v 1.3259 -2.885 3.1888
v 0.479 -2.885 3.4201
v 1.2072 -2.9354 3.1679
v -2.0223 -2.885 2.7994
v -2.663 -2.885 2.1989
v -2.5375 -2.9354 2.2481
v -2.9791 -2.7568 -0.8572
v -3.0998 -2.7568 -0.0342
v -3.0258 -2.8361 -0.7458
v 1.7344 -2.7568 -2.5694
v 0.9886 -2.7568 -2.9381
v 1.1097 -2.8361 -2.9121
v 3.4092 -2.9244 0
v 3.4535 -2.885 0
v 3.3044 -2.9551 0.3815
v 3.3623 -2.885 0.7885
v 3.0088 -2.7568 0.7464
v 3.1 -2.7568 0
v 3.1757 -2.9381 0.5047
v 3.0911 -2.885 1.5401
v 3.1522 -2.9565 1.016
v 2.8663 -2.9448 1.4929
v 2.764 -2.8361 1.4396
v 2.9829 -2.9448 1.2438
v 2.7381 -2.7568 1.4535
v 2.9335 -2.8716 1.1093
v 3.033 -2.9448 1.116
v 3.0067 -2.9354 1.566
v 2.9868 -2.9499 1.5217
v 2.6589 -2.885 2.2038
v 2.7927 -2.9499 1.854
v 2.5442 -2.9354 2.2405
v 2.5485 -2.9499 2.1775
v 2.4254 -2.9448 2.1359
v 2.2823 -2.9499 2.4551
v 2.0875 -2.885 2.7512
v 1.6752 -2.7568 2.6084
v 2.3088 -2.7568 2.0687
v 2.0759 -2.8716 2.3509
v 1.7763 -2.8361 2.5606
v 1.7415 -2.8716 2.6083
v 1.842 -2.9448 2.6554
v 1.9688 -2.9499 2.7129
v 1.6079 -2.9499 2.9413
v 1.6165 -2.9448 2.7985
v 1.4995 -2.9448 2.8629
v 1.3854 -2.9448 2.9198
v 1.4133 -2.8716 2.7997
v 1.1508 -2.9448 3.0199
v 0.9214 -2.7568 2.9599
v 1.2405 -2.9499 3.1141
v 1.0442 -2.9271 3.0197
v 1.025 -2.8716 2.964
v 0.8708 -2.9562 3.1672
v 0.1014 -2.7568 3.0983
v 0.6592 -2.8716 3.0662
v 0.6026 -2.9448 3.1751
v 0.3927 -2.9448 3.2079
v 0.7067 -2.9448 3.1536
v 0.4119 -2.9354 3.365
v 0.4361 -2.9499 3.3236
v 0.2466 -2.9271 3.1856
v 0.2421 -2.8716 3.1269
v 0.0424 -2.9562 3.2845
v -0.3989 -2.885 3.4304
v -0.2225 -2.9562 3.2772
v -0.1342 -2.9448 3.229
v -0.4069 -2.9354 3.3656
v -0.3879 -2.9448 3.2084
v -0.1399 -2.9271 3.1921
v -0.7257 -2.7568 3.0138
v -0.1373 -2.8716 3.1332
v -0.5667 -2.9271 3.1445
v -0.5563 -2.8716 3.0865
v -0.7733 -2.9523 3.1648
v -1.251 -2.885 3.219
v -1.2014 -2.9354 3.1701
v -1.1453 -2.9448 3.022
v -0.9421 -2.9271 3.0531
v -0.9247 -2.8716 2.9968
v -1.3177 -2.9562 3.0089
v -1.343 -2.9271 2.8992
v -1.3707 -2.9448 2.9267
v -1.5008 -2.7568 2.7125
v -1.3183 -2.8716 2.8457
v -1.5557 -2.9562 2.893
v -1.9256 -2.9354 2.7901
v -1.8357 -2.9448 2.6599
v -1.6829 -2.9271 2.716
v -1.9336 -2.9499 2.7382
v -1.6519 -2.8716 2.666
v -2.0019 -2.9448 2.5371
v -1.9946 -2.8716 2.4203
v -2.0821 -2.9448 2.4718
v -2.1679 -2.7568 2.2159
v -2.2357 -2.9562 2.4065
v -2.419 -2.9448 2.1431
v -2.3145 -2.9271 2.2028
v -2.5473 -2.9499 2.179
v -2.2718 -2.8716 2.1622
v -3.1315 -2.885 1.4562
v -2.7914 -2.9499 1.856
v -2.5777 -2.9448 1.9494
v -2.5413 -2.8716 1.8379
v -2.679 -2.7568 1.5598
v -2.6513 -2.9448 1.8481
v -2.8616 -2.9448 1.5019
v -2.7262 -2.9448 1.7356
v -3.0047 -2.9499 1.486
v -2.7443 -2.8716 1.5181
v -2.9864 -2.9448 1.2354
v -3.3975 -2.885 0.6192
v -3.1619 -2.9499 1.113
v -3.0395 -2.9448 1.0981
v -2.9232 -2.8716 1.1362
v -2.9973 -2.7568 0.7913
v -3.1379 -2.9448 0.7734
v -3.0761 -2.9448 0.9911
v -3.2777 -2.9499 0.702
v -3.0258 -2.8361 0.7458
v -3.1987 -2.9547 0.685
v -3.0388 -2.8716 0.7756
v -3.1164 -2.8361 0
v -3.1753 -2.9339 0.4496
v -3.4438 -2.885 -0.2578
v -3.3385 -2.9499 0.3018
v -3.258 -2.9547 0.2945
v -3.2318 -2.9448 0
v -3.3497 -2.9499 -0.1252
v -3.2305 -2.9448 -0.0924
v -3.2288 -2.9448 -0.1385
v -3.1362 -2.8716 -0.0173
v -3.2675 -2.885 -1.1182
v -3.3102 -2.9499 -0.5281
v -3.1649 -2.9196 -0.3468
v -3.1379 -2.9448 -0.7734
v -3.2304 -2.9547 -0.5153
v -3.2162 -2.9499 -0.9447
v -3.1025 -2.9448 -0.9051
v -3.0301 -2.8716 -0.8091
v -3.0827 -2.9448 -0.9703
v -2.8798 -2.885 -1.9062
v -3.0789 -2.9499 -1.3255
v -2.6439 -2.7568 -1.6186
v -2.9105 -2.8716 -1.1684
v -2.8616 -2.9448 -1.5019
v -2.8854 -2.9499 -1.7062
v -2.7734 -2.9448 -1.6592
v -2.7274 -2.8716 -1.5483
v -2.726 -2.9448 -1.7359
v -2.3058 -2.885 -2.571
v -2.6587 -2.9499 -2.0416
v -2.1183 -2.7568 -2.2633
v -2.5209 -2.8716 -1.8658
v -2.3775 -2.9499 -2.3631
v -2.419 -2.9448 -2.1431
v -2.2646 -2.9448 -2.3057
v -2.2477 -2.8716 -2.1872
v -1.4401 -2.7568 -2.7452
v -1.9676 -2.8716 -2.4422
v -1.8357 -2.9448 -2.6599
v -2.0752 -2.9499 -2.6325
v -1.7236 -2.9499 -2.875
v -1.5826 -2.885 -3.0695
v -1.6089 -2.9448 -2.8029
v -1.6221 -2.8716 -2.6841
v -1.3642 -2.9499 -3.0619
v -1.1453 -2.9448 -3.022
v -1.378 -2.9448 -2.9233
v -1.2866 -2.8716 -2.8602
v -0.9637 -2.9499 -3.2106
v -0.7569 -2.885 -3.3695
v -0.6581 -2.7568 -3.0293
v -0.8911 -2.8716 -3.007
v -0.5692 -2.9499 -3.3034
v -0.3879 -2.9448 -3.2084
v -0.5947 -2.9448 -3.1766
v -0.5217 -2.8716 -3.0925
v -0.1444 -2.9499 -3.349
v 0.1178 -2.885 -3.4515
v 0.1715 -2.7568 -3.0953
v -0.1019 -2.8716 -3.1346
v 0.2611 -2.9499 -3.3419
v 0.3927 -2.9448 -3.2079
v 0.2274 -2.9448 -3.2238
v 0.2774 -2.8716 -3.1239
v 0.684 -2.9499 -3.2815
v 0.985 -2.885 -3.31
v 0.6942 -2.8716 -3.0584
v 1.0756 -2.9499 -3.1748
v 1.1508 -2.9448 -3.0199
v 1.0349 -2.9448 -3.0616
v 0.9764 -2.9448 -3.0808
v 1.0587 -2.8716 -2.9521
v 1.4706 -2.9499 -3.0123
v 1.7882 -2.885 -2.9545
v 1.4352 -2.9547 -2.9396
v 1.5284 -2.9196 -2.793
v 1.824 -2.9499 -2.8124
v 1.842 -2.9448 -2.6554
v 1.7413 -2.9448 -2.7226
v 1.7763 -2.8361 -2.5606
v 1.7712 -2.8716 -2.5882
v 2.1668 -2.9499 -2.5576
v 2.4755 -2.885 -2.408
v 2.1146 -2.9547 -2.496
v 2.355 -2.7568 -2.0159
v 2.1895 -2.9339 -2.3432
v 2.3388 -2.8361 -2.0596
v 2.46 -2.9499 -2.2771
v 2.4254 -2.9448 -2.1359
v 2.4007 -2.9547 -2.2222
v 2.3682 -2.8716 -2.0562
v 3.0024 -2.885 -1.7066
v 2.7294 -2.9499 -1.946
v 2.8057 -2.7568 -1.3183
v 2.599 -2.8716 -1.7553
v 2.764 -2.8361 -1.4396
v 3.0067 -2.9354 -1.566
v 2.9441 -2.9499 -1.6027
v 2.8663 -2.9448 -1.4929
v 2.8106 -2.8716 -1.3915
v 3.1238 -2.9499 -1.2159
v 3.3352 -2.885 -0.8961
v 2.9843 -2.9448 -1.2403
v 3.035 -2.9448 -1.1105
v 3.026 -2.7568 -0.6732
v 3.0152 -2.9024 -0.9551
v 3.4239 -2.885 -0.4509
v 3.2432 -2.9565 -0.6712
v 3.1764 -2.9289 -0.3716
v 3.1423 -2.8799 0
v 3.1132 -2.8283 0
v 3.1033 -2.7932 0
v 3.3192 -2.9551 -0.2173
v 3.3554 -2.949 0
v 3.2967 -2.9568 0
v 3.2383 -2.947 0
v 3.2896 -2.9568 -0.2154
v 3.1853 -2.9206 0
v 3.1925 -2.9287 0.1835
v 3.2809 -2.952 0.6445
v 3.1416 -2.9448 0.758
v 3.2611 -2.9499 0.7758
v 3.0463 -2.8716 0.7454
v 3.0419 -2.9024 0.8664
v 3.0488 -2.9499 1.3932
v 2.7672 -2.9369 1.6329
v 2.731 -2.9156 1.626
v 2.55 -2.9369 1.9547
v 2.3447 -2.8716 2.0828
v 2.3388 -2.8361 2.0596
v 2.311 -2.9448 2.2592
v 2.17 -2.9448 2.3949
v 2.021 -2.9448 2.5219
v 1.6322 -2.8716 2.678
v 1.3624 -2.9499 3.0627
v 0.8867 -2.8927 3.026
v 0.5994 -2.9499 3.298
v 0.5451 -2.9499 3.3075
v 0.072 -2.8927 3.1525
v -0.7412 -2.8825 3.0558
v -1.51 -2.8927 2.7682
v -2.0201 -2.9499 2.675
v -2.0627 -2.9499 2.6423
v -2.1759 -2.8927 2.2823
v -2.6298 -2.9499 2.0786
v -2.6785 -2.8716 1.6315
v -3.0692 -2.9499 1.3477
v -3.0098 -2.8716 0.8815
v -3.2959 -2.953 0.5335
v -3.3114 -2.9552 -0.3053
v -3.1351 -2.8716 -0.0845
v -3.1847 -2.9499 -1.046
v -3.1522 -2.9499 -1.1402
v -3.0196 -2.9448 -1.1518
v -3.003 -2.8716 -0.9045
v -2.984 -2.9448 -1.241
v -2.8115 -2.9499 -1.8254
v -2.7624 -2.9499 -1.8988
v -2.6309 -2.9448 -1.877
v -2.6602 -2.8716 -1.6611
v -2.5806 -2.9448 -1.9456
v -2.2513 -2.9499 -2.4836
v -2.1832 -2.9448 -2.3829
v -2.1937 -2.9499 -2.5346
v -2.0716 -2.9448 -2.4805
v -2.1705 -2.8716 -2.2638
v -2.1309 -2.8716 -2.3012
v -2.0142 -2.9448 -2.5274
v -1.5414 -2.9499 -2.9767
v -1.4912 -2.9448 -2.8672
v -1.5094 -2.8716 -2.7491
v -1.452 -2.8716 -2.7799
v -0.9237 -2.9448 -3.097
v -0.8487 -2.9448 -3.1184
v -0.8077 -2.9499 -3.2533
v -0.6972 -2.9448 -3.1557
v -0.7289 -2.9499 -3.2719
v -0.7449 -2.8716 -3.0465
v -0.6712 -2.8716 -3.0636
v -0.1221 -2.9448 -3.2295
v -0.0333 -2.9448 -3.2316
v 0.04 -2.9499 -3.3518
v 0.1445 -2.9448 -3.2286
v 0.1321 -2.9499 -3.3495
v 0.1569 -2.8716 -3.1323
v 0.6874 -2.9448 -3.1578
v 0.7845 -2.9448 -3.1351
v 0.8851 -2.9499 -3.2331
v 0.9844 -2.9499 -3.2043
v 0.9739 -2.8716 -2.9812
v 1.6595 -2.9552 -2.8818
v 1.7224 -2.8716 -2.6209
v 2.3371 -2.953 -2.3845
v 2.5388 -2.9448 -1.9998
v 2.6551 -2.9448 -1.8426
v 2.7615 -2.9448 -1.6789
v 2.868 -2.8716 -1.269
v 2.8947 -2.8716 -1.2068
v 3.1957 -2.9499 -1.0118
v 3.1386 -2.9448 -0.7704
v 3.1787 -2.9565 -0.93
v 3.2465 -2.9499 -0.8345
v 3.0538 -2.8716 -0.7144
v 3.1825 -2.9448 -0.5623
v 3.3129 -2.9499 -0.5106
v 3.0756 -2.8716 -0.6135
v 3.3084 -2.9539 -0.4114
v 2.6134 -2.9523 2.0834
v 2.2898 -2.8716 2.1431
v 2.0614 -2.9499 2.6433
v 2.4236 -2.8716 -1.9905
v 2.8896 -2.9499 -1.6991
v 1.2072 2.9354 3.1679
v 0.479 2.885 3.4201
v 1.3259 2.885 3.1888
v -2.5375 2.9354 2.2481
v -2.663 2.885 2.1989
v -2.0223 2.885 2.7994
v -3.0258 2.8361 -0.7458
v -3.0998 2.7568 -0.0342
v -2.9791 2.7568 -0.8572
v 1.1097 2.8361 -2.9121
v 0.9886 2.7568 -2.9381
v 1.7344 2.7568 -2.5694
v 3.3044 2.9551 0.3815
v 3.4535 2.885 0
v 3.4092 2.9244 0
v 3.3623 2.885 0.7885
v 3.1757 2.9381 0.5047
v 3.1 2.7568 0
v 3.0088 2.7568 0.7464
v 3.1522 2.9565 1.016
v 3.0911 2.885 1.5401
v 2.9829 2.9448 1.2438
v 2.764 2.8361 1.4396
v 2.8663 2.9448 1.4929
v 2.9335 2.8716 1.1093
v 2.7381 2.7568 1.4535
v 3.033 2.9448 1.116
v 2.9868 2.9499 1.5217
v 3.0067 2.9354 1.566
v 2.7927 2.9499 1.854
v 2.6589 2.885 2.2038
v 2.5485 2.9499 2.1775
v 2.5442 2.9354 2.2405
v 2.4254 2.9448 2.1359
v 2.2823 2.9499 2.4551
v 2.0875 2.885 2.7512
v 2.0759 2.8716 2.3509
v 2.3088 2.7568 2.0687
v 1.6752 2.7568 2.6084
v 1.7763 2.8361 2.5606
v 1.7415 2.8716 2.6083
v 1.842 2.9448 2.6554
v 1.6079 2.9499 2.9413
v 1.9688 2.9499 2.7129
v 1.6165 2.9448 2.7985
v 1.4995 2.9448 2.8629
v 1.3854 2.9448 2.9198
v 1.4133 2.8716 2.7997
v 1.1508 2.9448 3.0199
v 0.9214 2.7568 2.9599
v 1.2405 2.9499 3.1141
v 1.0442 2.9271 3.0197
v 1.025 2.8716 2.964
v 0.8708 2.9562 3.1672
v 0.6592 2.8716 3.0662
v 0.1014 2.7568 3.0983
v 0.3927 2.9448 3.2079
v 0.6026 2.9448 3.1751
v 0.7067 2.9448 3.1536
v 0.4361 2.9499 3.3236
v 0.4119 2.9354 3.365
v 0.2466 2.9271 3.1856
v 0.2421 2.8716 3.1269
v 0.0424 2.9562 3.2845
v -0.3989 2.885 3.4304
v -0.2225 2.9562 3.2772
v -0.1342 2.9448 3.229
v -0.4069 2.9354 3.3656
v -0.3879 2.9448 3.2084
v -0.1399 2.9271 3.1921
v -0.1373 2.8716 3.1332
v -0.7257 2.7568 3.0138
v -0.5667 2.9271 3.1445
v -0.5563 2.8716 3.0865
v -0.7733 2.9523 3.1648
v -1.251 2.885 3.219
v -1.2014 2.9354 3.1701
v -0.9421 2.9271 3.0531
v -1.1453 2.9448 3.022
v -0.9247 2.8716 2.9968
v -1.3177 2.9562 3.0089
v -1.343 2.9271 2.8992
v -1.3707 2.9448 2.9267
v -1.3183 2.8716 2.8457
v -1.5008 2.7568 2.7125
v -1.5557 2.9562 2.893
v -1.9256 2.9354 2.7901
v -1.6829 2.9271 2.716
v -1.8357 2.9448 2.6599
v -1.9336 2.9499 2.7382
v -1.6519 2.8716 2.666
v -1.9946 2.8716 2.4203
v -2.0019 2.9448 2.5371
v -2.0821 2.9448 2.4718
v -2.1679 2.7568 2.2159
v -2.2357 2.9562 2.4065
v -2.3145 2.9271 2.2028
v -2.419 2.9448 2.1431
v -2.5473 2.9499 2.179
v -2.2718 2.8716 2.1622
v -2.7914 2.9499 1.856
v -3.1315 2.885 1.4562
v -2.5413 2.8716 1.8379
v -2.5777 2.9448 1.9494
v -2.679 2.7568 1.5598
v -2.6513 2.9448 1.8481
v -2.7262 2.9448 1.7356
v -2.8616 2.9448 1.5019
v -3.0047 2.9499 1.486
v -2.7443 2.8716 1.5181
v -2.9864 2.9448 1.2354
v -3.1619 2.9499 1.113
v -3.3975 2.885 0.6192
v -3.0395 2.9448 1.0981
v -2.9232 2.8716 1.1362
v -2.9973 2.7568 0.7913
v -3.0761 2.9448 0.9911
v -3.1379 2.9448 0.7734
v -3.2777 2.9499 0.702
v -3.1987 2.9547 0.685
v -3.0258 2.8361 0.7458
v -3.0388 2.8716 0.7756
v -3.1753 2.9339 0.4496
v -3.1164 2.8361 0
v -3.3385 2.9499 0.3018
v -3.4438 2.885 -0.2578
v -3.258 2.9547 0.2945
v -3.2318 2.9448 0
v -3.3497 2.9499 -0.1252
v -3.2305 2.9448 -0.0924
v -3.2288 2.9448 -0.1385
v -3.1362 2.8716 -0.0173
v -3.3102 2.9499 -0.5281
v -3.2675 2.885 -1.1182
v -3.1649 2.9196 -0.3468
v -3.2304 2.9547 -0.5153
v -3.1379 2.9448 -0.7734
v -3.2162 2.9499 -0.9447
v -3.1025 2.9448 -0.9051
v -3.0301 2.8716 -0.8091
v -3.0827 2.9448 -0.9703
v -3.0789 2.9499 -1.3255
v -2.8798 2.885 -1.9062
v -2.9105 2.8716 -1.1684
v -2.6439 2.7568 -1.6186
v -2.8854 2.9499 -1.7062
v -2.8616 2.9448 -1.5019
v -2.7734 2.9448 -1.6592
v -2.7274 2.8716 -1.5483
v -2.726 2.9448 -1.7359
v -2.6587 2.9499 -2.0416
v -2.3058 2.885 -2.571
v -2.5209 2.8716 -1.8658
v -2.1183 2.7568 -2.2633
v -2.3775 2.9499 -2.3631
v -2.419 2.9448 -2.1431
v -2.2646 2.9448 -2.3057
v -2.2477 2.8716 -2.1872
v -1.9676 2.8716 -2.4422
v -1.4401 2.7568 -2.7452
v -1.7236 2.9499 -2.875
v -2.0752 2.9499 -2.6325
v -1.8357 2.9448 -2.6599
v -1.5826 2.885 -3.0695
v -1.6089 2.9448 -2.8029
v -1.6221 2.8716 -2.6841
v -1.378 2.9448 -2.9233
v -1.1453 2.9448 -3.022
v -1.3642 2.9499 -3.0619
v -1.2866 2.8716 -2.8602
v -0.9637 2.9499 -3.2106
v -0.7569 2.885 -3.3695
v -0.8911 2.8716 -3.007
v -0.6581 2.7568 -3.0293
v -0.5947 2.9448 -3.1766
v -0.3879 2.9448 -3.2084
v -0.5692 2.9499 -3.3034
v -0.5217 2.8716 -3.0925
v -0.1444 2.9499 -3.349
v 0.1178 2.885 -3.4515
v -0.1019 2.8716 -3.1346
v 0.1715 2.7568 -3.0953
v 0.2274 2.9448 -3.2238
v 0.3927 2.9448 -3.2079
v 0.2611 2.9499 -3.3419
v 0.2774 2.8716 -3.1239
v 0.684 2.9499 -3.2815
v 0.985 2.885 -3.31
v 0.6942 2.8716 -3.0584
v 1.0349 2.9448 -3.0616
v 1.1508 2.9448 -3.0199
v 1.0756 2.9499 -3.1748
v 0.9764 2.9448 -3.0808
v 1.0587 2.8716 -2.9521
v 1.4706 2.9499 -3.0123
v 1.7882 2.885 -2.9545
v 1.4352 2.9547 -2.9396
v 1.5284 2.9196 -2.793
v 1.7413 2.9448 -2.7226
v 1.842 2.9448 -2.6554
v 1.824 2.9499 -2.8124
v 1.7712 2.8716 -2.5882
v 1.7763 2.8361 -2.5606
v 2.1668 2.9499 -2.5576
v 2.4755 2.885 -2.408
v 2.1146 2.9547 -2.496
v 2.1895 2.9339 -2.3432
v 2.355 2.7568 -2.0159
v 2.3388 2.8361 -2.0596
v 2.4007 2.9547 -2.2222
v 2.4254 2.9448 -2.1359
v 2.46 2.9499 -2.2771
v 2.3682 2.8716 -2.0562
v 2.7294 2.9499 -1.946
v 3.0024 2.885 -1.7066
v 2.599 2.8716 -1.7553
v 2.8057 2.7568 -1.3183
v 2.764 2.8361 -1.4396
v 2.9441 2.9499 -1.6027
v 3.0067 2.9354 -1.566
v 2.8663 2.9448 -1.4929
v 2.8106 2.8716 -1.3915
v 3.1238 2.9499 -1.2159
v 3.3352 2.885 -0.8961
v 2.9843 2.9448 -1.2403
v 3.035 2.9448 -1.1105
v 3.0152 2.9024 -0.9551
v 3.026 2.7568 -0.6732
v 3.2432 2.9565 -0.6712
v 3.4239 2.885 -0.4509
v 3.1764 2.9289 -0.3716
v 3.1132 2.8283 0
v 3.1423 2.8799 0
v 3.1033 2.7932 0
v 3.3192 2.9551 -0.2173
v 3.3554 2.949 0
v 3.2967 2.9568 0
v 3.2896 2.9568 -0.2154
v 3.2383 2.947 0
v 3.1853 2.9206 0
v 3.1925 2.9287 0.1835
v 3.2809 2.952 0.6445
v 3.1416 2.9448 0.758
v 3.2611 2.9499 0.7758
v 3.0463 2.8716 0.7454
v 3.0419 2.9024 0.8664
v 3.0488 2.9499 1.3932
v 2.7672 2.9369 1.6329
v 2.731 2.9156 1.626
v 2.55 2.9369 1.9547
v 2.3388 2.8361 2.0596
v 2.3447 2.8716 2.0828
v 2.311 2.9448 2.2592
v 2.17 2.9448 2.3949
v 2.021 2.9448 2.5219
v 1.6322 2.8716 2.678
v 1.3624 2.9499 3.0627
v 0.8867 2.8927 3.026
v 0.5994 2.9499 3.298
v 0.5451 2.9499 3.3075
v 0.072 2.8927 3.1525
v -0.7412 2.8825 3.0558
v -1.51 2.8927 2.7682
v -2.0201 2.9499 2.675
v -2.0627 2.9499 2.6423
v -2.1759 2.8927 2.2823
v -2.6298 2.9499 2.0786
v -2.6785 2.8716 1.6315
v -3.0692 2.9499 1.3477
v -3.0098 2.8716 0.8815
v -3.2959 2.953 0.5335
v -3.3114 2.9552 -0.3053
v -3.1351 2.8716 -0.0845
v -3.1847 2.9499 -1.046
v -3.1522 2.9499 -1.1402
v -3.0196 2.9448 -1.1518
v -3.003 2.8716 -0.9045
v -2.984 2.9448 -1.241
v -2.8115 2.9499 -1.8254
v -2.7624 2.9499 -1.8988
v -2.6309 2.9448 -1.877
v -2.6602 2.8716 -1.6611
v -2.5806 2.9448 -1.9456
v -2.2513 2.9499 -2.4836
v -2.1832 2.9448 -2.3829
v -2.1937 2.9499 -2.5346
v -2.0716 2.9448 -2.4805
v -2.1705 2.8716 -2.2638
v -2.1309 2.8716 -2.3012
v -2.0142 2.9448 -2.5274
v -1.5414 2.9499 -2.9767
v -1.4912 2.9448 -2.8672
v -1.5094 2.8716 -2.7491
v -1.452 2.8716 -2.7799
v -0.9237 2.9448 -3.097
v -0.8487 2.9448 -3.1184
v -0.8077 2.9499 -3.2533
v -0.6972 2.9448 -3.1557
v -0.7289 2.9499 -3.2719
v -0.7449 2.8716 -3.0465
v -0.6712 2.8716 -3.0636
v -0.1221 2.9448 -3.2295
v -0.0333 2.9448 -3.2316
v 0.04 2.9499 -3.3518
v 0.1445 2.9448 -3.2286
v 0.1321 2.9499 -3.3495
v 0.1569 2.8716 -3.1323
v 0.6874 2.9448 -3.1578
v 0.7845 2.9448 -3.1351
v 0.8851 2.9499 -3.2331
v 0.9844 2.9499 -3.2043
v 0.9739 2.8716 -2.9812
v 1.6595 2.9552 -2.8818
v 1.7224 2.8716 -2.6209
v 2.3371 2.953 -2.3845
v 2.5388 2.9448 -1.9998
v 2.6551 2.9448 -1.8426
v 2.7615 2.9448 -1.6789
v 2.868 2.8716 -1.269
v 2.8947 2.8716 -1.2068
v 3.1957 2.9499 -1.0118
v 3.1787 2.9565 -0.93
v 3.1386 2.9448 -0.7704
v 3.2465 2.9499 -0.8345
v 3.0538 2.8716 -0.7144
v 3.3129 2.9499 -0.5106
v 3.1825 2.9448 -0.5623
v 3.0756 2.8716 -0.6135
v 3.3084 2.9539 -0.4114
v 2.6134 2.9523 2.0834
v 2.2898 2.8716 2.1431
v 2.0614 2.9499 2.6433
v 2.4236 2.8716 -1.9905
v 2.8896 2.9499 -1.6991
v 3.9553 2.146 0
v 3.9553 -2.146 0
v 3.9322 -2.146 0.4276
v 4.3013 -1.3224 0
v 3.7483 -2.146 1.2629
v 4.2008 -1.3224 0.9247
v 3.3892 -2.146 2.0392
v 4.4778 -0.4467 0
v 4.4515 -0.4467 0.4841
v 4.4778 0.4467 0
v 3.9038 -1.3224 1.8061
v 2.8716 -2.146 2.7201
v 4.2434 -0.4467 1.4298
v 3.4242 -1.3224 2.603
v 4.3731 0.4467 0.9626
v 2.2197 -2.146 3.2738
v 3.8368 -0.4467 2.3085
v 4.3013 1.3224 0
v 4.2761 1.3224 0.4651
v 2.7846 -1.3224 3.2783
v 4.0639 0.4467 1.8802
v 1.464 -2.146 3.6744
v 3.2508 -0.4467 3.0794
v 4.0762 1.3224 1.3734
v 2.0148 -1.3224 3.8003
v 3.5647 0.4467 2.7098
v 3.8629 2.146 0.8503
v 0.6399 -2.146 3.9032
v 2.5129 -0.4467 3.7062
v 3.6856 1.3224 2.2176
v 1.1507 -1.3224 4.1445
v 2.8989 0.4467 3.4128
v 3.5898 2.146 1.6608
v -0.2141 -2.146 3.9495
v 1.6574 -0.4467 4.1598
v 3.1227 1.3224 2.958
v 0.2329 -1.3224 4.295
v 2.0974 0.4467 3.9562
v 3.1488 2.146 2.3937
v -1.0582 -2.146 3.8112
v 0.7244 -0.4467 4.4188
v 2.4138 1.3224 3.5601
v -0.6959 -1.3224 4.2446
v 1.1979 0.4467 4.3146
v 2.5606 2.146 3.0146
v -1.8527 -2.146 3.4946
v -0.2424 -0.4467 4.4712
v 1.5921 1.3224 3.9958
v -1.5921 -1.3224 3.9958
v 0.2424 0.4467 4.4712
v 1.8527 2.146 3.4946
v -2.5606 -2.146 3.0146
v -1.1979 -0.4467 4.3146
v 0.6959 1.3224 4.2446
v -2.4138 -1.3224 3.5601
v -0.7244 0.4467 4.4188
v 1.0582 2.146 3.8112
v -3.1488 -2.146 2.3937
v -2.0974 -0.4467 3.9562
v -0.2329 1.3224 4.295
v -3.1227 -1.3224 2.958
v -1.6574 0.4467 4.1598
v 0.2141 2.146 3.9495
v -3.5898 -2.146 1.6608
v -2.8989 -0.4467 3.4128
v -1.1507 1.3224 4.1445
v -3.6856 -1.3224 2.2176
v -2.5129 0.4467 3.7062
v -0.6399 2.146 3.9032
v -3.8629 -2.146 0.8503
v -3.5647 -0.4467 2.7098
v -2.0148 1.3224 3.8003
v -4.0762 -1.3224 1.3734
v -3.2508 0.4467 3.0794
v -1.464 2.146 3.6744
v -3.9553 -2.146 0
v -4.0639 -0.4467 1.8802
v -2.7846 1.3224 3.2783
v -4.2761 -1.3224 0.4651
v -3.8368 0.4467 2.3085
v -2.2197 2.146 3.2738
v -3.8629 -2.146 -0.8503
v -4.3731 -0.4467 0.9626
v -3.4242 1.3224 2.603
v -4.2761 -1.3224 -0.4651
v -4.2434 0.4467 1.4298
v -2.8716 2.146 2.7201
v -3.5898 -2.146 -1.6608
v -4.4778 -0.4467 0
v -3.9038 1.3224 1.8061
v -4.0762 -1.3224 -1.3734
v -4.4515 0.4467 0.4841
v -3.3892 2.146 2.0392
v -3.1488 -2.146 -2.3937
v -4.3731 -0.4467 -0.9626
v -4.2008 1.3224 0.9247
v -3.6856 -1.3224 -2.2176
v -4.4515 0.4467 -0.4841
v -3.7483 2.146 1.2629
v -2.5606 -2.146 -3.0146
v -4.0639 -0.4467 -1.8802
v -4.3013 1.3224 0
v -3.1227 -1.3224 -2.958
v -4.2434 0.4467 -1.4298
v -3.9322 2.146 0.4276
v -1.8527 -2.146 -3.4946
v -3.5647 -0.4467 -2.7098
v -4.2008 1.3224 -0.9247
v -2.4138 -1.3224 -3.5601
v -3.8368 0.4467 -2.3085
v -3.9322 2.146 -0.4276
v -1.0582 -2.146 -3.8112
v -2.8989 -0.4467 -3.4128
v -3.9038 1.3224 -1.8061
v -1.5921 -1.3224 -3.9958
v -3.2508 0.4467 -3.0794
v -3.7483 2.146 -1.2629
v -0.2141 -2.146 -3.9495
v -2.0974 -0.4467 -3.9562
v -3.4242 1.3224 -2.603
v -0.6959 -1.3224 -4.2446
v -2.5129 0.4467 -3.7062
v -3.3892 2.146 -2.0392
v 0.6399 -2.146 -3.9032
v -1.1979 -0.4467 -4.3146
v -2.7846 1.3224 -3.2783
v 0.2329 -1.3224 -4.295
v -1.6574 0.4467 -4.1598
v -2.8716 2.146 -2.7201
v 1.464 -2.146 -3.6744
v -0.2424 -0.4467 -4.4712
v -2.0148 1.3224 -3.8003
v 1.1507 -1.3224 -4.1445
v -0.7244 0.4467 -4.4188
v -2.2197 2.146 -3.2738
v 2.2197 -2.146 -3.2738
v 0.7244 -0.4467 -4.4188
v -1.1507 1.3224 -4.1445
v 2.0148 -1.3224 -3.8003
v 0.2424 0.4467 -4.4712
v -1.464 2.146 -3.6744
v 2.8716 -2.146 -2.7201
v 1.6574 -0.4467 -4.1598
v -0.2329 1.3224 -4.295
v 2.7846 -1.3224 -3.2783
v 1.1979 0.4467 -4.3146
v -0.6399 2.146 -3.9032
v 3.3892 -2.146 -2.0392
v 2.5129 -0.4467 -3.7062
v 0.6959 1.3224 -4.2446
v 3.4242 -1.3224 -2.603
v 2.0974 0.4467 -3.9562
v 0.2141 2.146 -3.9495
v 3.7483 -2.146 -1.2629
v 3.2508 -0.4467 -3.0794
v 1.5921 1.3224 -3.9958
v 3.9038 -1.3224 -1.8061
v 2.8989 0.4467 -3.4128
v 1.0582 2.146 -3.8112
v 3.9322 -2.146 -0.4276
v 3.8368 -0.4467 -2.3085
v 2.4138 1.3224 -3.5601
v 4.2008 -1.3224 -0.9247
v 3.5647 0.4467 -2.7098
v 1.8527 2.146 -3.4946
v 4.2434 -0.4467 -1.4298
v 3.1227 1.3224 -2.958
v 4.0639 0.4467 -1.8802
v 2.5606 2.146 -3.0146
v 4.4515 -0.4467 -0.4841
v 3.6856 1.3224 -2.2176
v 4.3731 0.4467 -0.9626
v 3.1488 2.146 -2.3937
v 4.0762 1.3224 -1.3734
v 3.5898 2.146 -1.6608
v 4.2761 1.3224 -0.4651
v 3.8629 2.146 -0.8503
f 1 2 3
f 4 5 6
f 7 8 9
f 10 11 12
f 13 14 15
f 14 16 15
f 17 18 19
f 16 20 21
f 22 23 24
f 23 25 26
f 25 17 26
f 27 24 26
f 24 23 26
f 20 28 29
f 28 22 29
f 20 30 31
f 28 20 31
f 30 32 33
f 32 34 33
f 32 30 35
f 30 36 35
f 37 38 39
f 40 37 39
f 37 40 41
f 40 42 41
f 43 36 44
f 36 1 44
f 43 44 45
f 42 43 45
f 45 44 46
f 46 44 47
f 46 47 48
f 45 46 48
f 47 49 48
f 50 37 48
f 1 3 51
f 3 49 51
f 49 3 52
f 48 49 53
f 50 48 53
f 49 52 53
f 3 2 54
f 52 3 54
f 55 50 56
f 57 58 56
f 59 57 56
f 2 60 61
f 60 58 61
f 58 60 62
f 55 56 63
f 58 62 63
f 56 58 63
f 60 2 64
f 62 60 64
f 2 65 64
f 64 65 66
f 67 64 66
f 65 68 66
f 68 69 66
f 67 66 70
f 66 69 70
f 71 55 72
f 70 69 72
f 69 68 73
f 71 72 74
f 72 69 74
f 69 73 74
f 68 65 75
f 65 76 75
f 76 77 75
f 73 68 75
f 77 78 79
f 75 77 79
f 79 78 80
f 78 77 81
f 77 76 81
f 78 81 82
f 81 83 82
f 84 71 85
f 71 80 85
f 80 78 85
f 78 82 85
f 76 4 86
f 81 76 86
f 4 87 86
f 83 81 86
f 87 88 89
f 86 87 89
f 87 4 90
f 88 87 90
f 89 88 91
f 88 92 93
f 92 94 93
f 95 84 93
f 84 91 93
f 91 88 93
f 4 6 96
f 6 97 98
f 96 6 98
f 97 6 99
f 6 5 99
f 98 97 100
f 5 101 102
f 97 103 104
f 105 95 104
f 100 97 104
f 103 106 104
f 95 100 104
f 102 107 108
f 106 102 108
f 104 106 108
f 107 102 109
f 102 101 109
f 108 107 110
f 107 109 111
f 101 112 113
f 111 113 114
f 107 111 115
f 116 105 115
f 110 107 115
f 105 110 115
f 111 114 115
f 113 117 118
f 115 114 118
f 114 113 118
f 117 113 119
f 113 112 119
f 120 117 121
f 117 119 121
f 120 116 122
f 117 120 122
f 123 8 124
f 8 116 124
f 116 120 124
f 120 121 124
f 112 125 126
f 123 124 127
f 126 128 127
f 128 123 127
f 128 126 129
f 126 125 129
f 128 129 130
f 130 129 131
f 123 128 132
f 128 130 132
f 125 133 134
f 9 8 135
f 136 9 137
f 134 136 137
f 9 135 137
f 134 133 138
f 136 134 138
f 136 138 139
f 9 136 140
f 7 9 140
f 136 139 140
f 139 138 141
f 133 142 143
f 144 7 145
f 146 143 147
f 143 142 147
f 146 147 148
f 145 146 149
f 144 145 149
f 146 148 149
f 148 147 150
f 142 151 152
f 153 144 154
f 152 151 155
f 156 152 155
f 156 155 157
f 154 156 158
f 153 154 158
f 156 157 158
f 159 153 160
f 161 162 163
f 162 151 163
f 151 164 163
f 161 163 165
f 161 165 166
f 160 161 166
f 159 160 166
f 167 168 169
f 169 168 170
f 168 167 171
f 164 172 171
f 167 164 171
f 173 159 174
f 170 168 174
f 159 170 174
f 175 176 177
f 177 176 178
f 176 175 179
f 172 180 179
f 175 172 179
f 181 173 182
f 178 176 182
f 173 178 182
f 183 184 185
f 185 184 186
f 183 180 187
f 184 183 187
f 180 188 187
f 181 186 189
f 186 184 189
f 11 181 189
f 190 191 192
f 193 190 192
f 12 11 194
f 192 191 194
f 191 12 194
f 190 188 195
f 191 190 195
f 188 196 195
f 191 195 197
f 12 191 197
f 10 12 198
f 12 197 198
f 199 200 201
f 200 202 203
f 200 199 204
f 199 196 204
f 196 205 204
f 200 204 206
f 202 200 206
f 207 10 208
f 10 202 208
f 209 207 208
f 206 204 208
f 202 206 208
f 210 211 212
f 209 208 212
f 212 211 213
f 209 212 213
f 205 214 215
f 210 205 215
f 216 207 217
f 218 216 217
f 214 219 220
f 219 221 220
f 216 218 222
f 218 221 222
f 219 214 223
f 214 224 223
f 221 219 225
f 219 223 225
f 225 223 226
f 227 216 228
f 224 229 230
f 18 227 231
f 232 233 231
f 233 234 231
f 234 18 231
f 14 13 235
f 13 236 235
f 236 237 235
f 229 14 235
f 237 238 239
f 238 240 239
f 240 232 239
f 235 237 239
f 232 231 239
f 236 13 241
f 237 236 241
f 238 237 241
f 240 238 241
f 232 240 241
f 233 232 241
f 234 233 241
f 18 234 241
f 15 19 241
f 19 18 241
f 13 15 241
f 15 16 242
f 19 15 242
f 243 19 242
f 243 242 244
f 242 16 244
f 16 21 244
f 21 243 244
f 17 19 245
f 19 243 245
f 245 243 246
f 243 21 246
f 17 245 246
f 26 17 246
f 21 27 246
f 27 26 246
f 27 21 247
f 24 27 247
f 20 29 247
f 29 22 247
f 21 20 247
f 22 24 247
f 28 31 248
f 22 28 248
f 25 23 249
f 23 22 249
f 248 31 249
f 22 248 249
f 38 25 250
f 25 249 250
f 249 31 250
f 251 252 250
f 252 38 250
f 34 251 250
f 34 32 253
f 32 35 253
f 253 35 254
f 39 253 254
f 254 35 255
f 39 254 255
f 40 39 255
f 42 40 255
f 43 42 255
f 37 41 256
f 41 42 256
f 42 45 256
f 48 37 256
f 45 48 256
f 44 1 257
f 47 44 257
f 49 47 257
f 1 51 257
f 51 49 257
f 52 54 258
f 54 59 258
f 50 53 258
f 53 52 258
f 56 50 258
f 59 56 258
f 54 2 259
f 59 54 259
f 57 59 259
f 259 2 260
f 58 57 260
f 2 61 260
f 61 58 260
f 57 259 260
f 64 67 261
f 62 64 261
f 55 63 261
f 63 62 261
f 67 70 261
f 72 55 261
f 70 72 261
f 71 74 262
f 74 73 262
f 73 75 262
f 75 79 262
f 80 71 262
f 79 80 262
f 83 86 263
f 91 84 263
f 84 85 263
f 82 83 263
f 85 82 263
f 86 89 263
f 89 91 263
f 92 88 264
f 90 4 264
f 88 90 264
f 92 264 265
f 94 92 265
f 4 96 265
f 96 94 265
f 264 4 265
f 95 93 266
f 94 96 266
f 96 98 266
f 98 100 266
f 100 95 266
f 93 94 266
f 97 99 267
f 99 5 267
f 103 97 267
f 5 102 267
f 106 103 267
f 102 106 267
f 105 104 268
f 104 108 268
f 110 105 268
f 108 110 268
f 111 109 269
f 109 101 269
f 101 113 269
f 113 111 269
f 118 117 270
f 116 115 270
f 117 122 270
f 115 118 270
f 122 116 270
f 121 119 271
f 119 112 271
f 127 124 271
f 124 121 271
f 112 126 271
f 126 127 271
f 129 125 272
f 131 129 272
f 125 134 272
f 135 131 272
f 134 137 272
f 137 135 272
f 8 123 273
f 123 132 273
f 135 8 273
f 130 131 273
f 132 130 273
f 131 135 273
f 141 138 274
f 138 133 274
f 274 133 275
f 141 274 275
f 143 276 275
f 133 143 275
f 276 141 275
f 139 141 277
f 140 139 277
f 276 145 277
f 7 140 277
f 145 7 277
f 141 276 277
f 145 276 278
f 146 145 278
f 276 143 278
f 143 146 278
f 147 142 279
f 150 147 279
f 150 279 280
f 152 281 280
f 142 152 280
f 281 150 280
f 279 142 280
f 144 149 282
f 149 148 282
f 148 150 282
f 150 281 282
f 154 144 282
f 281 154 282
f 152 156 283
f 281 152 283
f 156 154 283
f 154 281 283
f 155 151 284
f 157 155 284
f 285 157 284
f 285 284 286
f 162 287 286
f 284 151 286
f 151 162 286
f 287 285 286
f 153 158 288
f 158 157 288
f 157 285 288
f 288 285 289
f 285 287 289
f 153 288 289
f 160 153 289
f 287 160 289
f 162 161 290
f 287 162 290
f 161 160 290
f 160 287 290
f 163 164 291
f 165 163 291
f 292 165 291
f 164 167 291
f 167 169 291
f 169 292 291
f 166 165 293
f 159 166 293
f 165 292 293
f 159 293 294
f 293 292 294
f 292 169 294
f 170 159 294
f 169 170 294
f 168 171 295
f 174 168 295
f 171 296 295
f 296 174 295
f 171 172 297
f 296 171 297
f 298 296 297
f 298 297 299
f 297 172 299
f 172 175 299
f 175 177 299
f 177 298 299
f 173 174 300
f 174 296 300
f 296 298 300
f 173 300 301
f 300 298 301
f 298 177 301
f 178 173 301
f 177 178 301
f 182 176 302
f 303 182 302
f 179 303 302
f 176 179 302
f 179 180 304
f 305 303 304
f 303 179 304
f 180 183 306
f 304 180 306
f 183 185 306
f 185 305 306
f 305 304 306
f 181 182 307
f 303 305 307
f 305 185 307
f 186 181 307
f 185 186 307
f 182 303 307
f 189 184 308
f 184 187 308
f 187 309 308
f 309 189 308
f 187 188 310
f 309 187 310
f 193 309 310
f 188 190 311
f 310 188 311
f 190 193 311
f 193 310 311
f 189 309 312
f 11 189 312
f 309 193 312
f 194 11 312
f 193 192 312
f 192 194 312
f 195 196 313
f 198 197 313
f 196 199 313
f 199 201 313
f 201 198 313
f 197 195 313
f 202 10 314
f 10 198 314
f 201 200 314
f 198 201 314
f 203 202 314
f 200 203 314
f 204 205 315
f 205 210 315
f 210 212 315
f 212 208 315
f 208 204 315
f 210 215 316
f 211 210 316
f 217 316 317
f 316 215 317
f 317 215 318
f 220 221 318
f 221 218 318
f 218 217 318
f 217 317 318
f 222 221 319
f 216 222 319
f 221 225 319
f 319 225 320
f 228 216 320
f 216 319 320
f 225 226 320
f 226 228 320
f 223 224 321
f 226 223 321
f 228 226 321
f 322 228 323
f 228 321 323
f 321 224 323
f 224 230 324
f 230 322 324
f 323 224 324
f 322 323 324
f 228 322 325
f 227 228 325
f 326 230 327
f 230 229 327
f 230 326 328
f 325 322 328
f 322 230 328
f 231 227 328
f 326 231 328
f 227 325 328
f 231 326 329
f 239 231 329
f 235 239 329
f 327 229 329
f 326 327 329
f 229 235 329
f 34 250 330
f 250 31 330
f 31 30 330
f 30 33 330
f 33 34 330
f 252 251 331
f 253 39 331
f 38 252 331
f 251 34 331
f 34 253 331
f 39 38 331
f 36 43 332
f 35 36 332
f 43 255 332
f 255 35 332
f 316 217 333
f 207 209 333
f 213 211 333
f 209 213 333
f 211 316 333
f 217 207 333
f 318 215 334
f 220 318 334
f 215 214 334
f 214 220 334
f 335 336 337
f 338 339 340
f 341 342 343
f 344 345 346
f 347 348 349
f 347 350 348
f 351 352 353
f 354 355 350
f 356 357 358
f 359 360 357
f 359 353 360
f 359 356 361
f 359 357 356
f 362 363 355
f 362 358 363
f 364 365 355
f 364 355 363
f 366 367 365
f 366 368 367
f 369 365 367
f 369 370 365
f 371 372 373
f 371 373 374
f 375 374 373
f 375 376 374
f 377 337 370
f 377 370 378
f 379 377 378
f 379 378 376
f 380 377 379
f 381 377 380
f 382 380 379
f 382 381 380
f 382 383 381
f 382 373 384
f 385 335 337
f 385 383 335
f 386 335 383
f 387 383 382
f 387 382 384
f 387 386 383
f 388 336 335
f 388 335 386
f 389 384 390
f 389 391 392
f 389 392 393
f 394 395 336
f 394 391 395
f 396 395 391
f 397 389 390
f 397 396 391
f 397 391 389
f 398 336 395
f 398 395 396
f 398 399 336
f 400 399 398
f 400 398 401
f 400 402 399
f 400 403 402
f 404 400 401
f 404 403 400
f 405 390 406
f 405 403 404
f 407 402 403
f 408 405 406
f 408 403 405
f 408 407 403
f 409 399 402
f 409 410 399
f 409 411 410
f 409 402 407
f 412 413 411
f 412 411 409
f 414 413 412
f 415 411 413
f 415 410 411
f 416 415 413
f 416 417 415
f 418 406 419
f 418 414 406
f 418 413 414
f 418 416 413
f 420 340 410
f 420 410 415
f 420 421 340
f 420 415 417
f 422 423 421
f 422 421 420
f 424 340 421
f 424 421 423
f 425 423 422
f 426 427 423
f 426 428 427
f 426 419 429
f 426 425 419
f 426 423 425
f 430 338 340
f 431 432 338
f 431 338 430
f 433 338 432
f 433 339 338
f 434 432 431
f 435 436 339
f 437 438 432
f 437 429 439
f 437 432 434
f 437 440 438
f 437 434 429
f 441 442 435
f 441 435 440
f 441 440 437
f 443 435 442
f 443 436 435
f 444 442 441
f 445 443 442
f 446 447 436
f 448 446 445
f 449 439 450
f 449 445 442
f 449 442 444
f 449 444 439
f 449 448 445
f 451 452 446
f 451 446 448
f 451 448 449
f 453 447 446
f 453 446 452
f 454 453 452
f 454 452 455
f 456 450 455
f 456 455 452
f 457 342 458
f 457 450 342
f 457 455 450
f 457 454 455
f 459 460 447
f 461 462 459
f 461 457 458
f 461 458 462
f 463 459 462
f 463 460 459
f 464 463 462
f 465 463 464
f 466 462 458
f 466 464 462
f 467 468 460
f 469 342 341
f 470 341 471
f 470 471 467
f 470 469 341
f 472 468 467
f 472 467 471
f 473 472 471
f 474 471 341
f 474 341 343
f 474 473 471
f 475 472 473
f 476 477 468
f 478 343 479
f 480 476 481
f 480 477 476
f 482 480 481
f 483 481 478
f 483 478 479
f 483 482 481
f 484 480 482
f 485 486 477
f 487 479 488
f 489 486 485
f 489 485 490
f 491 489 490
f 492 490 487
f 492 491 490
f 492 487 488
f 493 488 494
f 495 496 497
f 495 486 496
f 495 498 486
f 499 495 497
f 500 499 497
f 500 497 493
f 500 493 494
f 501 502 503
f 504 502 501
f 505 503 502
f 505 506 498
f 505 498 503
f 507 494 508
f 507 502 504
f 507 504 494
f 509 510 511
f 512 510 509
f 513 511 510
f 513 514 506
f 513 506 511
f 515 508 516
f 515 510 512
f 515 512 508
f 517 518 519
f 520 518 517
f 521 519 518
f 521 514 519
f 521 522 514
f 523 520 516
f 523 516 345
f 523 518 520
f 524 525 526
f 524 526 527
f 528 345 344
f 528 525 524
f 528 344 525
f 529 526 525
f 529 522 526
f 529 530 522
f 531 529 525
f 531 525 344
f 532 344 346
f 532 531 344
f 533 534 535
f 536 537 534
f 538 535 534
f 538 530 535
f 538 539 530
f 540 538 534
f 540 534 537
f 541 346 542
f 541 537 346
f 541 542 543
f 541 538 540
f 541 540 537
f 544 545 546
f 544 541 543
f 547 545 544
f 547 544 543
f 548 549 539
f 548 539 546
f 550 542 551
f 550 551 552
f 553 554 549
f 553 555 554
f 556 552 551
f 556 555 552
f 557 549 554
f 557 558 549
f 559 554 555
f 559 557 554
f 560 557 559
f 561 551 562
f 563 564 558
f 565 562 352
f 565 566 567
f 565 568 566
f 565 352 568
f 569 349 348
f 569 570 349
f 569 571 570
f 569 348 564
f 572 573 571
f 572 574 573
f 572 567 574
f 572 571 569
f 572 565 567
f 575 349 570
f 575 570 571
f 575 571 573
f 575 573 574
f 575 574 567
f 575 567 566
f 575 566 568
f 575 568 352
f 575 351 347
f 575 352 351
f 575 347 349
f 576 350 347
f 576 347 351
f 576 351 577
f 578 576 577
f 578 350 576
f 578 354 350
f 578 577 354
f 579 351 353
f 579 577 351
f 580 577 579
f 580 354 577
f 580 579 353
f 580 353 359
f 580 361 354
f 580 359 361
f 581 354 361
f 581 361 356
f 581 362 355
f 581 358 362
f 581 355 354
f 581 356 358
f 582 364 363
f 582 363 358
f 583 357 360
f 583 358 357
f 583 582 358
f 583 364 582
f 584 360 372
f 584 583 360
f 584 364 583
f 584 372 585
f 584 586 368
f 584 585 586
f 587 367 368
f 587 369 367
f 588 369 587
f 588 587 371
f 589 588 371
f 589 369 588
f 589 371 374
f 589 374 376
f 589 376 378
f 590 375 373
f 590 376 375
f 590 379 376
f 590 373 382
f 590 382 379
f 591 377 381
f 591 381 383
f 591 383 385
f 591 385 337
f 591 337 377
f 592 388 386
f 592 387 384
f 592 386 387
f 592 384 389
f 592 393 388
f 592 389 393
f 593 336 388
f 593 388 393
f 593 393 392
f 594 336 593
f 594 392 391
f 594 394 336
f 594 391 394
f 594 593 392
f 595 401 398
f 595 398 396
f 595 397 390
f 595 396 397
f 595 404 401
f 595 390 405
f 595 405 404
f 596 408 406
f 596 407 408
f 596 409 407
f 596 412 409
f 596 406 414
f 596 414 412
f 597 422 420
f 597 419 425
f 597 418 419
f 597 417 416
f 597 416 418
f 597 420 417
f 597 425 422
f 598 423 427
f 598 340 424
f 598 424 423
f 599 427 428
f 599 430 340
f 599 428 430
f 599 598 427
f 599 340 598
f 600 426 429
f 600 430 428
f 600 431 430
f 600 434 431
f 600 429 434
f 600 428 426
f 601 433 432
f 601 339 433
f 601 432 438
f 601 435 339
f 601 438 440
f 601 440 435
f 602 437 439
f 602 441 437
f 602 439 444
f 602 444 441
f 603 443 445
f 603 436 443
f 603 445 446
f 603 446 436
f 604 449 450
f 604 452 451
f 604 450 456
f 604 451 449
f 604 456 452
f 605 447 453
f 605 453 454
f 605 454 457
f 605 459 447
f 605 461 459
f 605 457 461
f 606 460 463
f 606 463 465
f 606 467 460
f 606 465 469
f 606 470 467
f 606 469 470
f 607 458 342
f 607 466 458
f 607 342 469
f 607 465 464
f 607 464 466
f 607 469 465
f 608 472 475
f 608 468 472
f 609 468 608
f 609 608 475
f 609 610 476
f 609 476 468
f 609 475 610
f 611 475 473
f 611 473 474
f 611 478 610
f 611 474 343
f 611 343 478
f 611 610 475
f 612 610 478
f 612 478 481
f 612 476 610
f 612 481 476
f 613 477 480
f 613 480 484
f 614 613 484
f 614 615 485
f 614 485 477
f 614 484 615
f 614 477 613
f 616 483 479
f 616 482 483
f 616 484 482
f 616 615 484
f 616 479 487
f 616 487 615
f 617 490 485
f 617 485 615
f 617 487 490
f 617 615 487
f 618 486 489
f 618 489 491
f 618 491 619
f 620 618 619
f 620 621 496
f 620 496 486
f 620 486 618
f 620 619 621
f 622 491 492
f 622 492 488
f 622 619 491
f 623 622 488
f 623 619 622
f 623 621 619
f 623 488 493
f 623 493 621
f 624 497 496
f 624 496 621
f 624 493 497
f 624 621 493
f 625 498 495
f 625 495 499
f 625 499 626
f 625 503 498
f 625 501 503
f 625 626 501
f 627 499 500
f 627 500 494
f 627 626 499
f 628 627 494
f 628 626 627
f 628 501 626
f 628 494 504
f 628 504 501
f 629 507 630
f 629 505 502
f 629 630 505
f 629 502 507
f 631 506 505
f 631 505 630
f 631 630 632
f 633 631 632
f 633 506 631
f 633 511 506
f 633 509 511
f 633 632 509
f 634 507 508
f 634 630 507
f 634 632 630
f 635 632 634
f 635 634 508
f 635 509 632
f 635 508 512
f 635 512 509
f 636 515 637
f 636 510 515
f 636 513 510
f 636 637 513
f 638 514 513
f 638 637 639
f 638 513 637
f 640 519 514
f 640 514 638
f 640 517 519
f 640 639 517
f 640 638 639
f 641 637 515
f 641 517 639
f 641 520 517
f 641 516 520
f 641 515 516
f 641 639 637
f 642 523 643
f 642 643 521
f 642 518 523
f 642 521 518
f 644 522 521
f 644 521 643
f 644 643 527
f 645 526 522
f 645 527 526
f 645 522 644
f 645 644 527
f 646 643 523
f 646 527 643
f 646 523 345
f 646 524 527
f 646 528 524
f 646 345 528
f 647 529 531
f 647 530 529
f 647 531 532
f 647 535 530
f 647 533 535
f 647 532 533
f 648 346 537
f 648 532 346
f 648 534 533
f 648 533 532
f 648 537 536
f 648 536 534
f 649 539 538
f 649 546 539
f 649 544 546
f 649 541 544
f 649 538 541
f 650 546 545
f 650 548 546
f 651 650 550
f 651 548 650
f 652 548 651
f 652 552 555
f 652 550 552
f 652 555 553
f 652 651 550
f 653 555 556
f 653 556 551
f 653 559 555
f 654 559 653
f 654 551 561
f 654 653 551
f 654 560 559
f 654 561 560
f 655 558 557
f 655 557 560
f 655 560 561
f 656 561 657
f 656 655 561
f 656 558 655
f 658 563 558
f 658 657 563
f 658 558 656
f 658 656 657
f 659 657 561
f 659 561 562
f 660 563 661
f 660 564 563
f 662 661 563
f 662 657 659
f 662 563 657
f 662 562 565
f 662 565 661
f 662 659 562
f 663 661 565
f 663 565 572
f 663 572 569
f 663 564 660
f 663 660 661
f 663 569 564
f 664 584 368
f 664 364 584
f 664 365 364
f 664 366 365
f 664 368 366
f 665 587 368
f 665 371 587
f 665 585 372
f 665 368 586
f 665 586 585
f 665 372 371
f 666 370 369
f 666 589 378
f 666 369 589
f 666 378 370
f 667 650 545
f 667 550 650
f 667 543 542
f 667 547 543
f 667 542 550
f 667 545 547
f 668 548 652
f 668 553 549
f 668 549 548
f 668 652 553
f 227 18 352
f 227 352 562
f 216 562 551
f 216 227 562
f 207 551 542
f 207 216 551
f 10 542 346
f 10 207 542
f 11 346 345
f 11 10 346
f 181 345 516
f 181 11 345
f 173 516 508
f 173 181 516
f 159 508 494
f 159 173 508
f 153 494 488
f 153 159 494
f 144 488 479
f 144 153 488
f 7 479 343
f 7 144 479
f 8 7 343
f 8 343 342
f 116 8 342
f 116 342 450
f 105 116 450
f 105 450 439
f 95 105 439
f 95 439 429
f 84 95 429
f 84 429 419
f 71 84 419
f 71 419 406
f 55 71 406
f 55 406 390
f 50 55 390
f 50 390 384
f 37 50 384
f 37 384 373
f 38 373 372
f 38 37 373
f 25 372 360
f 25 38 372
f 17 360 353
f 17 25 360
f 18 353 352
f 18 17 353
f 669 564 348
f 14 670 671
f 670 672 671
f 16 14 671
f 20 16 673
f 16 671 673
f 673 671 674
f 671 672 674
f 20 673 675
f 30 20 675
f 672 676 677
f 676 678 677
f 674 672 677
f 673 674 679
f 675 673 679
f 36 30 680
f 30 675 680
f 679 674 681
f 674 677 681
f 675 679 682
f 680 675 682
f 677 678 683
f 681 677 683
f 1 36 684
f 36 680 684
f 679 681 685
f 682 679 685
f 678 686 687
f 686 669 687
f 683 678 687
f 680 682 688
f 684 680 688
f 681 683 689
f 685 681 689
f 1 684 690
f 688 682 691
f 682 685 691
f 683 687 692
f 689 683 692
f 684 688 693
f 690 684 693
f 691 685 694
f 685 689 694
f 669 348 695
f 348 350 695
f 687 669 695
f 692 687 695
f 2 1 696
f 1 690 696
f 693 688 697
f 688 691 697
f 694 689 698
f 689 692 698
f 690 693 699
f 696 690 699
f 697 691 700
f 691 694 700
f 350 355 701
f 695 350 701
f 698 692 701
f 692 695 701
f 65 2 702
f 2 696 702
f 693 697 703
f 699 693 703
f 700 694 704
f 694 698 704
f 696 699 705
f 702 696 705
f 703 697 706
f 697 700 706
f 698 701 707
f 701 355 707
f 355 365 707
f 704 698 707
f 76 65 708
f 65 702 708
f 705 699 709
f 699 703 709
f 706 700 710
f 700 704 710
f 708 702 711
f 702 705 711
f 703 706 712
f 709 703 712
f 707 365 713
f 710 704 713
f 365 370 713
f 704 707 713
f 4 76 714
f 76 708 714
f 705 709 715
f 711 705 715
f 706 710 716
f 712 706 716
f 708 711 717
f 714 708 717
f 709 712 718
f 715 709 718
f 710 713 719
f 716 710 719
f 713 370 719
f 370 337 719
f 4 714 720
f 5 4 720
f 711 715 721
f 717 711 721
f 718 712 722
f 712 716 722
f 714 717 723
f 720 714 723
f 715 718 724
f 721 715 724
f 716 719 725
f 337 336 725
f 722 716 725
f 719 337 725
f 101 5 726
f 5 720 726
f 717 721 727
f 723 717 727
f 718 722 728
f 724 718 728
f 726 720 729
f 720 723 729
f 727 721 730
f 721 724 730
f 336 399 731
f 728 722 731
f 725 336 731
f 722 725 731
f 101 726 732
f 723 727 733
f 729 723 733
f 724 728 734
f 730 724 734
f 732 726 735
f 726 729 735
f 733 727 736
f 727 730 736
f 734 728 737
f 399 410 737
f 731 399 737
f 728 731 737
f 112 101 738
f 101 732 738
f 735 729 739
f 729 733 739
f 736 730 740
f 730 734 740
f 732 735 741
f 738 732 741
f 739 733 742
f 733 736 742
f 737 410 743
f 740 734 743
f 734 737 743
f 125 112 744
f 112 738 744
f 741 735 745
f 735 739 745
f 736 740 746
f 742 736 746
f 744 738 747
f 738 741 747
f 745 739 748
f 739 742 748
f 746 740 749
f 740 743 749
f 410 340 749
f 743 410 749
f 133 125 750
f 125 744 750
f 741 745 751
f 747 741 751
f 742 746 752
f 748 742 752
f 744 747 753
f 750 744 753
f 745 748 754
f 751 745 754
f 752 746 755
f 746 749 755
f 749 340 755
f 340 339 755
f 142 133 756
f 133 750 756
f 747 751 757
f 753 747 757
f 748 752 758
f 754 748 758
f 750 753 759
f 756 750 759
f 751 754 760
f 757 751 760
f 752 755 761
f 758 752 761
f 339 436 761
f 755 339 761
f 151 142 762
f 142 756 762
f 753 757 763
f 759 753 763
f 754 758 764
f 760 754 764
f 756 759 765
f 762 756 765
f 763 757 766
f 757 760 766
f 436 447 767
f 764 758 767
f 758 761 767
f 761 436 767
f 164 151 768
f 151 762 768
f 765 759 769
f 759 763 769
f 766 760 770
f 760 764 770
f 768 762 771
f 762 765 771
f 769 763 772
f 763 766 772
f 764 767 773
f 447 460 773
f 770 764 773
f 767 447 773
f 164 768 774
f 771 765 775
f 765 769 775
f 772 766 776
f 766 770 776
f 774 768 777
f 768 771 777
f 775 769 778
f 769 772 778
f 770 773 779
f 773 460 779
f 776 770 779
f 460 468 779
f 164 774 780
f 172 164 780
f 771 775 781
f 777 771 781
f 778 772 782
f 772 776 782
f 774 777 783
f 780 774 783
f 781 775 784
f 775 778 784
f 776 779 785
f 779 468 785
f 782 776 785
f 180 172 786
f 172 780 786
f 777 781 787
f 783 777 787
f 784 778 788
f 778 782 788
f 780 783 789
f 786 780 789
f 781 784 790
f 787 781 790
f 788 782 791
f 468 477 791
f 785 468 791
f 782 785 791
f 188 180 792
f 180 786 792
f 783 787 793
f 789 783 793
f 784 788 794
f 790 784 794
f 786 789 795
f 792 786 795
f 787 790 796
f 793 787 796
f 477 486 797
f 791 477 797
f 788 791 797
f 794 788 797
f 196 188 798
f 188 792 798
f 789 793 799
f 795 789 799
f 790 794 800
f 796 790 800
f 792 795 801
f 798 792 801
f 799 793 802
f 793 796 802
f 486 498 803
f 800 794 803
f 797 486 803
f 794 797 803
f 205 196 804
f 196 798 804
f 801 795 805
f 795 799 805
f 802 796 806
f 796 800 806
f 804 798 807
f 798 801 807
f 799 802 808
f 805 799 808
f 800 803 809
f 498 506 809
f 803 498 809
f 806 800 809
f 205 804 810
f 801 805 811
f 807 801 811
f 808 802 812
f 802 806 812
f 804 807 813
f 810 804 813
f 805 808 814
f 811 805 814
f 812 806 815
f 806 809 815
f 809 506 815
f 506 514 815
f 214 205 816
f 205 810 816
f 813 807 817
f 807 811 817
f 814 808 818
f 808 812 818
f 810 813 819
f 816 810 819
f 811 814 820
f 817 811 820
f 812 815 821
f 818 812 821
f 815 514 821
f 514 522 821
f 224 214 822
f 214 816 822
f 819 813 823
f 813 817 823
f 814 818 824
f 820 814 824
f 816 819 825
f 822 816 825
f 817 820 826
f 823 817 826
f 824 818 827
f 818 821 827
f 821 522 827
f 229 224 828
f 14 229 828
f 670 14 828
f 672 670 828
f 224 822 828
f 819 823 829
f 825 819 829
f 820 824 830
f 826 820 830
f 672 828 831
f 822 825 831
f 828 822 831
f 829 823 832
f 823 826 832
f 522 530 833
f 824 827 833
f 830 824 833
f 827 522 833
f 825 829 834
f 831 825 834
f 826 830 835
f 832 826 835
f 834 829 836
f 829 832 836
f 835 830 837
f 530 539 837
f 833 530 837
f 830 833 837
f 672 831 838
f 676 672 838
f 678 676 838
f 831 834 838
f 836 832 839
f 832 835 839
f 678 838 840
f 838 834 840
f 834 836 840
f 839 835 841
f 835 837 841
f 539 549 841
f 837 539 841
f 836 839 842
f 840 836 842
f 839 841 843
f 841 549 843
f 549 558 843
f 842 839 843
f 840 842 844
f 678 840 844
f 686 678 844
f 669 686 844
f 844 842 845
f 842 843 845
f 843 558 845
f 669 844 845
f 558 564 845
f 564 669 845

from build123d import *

# Parameters (mm, degrees)
CUT_EXTRUDE1_DEPTH      = 10
CUT_EXTRUDE1_DEPTH_BACK = 10
SKETCH2_R               = 3.1
FILLET1_R               = 0.2


with BuildPart() as part:
    # Sketch1 → Revolve1 (revolve)
    with BuildSketch(Plane.XY):
        with BuildLine():
            Line((0, 4.5), (0, -4.5))
            ThreePointArc((0, -4.5), (4.5, 0), (0, 4.5))
        make_face()
    revolve(axis=Axis((0, 4.5, 0), (0, -1, 0)))

    # Sketch2 → Cut-Extrude1 (cut, two sides: drawn at the far end of the back side and taken through both)
    with BuildSketch(Plane(origin=(0, 0, 0), x_dir=(1, 0, 0), z_dir=(0, 1, 0)).offset(-CUT_EXTRUDE1_DEPTH_BACK)):
        Circle(SKETCH2_R)
    extrude(amount=CUT_EXTRUDE1_DEPTH + CUT_EXTRUDE1_DEPTH_BACK, mode=Mode.SUBTRACT)

    # Fillet1
    fillet1_edges = [part.edges().sort_by_distance(p)[0] for p in [
        (-3.1, -3.261901286, 0),
        (-3.1, 3.261901286, 0),
    ]]
    fillet(fillet1_edges, radius=FILLET1_R)


solid = part.part
